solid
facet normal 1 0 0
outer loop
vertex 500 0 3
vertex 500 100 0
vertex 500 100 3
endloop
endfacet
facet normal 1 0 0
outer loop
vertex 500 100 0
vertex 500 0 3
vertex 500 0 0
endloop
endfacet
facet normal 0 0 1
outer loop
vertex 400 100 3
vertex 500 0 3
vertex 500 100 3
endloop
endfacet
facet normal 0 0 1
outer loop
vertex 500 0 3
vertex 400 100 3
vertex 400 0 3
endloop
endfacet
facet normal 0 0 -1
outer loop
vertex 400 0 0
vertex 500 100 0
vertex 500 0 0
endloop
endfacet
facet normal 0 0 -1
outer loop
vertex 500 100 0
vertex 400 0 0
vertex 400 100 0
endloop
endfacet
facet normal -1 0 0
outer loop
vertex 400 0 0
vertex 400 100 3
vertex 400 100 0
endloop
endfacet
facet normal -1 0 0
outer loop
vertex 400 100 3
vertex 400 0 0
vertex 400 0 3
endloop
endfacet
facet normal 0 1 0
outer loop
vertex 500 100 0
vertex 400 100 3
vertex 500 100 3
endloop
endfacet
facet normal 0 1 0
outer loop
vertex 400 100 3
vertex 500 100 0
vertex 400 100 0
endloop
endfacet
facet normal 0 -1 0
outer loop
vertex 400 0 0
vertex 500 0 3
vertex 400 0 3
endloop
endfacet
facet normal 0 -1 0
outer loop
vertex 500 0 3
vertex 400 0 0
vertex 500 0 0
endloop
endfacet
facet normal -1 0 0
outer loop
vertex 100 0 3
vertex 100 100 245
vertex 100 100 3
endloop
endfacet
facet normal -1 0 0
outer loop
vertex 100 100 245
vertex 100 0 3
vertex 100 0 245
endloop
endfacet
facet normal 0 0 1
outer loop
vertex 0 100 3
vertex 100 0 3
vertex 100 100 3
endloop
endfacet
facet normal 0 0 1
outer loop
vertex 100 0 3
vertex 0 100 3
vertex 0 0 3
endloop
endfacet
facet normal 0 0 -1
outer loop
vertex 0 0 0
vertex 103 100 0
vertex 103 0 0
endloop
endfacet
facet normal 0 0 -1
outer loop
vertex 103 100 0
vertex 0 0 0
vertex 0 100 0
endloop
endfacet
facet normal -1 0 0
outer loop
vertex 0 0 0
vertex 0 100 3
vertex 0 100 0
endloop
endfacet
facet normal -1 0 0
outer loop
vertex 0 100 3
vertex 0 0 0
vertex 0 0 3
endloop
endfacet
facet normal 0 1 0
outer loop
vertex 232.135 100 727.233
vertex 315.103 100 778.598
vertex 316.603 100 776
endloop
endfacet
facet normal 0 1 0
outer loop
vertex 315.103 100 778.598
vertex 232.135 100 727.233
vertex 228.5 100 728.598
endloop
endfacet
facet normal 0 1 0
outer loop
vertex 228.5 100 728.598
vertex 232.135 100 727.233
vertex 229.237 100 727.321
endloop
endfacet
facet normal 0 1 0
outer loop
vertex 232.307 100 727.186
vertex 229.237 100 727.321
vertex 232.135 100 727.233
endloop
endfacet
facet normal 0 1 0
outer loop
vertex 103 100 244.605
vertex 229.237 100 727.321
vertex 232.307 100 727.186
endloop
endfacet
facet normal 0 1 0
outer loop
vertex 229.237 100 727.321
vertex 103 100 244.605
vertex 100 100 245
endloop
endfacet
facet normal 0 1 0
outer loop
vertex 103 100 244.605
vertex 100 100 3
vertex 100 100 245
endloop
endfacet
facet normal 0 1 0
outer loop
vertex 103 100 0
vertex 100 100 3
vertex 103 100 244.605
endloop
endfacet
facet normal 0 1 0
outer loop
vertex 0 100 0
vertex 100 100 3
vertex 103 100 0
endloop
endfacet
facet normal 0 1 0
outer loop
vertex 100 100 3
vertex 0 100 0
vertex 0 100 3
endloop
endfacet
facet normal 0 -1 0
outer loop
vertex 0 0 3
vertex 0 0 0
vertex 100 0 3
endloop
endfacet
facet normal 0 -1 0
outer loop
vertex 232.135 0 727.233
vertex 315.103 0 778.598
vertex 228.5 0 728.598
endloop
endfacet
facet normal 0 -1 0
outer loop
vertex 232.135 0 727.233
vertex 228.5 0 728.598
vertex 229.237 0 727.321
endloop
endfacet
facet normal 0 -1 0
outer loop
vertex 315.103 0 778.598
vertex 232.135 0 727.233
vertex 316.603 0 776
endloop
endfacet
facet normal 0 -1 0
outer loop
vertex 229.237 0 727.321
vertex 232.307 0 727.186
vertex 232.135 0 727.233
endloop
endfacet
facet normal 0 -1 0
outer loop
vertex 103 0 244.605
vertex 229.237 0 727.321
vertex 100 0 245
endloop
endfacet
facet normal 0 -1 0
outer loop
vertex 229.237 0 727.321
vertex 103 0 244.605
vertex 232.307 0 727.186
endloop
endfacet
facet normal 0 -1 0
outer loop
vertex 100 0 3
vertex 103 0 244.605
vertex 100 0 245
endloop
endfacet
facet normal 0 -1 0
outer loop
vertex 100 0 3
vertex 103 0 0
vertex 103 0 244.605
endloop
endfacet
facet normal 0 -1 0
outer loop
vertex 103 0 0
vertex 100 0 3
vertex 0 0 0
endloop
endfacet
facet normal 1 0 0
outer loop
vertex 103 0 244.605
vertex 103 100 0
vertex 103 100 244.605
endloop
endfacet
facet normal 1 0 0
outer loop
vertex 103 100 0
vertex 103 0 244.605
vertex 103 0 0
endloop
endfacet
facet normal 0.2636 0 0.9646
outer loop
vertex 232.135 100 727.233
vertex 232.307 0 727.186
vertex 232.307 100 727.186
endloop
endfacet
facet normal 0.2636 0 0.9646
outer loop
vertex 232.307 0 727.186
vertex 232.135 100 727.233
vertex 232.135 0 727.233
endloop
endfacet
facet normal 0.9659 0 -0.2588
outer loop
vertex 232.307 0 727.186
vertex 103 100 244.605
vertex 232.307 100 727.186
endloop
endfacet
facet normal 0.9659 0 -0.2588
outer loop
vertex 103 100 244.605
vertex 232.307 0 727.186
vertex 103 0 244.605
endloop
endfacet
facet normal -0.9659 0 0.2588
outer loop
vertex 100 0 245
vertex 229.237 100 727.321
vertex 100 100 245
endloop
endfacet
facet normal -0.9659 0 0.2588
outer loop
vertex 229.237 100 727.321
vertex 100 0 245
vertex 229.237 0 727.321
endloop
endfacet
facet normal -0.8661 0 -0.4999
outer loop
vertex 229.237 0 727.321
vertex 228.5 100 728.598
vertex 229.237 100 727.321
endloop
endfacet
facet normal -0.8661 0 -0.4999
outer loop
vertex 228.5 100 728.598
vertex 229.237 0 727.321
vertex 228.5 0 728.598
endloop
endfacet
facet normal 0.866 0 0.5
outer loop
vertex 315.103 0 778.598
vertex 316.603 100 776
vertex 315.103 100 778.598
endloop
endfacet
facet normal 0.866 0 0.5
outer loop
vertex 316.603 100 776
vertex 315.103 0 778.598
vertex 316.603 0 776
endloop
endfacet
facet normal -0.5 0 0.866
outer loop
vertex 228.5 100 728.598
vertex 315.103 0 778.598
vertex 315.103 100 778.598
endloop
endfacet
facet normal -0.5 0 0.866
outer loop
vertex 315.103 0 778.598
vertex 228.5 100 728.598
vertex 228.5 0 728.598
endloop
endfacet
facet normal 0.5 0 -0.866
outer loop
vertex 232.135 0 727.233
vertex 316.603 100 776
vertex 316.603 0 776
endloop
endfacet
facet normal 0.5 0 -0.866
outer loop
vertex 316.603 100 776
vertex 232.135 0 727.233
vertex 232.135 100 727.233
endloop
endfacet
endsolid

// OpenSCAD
// variables en mm
epaisseur = 3;
largeur = 100;
// premiere branche
cube([100,largeur,epaisseur],[0,0,0]);
translate([100,0,0])
    cube([epaisseur,largeur,245]);
translate([100,0,0])
    translate([0,0,245])
        rotate([0,15,0])    
            cube([epaisseur,largeur,500]);
translate([0,0,726])
    translate([230,0,0])
        rotate([0,-30,0])
            cube([100,largeur,epaisseur]);
translate([0,0,776])
    translate([315,0,0])
        polyhedron(
            points = [
            [0,0,0],     //0
            [epaisseur,0,0,],    //1
            [epaisseur,largeur,0],   //2
            [0,largeur,0],   //3
            [0,0.75 * largeur,65],   //4
            [epaisseur,0.75 * largeur,65] ,  //5
            ],
            faces = [
            [4,0,3],
            [0,4,5,1],
            [0,1,2,3],
            [3,2,4,5],
            [1,5,2]
            ]
        );
 translate([400,0,0])
    {
        cube([100,largeur,epaisseur],[0,0,0]);
        polyhedron(
        points = [
        [ 0,0,0 ], //0
        [ epaisseur,0,0 ], //1
        [ epaisseur,largeur,0 ], //2
        [ 0,largeur,0 ], //3
        [ 0,0,500], //4
        [ epaisseur,0,500 ], //5
        [ epaisseur,largeur,570 ], //6
        [ 0,largeur,570 ], //7
        ],
        faces = [
        [ 0,3,7,4 ] ,
        [ 0,1,2,3 ] ,
        [ 3,2,6,7 ] ,
        [ 7,6,5,4 ] ,
        [ 4,5,1,0 ] ,
        [ 1,2,6,5 ] ,
        ]
        );
        //echo(atan(70/largeur));
        //translate([0,0,500])
            //rotate([ 0,-45,0])
                //rotate([0,0,-atan(70/largeur)])
                    polyhedron(
                    points = [
                    [ 0,0,500 ] , // 0
                    [ epaisseur,0,500 ] , // 1
                    [ epaisseur,largeur,570 ] , // 2
                    [ 0,largeur,570 ] , // 3
                    [ -205,0, 600] , // 4
                    [ -205+epaisseur, 0, 600 ] , // 5
                    [ -185+epaisseur, largeur, 670] , // 6
                    [ -185, largeur, 670 ] , // 7
                    ] ,
                    faces = [
                    [ 0,3,7,4 ] ,
                    [ 0,1,2,3 ] ,
                    [ 3,2,6,7 ] ,
                    [ 7,6,5,4 ] ,
                    [ 4,5,1,0 ] ,
                    [ 1,2,6,5 ] ,
                    ]
                    );
    }
